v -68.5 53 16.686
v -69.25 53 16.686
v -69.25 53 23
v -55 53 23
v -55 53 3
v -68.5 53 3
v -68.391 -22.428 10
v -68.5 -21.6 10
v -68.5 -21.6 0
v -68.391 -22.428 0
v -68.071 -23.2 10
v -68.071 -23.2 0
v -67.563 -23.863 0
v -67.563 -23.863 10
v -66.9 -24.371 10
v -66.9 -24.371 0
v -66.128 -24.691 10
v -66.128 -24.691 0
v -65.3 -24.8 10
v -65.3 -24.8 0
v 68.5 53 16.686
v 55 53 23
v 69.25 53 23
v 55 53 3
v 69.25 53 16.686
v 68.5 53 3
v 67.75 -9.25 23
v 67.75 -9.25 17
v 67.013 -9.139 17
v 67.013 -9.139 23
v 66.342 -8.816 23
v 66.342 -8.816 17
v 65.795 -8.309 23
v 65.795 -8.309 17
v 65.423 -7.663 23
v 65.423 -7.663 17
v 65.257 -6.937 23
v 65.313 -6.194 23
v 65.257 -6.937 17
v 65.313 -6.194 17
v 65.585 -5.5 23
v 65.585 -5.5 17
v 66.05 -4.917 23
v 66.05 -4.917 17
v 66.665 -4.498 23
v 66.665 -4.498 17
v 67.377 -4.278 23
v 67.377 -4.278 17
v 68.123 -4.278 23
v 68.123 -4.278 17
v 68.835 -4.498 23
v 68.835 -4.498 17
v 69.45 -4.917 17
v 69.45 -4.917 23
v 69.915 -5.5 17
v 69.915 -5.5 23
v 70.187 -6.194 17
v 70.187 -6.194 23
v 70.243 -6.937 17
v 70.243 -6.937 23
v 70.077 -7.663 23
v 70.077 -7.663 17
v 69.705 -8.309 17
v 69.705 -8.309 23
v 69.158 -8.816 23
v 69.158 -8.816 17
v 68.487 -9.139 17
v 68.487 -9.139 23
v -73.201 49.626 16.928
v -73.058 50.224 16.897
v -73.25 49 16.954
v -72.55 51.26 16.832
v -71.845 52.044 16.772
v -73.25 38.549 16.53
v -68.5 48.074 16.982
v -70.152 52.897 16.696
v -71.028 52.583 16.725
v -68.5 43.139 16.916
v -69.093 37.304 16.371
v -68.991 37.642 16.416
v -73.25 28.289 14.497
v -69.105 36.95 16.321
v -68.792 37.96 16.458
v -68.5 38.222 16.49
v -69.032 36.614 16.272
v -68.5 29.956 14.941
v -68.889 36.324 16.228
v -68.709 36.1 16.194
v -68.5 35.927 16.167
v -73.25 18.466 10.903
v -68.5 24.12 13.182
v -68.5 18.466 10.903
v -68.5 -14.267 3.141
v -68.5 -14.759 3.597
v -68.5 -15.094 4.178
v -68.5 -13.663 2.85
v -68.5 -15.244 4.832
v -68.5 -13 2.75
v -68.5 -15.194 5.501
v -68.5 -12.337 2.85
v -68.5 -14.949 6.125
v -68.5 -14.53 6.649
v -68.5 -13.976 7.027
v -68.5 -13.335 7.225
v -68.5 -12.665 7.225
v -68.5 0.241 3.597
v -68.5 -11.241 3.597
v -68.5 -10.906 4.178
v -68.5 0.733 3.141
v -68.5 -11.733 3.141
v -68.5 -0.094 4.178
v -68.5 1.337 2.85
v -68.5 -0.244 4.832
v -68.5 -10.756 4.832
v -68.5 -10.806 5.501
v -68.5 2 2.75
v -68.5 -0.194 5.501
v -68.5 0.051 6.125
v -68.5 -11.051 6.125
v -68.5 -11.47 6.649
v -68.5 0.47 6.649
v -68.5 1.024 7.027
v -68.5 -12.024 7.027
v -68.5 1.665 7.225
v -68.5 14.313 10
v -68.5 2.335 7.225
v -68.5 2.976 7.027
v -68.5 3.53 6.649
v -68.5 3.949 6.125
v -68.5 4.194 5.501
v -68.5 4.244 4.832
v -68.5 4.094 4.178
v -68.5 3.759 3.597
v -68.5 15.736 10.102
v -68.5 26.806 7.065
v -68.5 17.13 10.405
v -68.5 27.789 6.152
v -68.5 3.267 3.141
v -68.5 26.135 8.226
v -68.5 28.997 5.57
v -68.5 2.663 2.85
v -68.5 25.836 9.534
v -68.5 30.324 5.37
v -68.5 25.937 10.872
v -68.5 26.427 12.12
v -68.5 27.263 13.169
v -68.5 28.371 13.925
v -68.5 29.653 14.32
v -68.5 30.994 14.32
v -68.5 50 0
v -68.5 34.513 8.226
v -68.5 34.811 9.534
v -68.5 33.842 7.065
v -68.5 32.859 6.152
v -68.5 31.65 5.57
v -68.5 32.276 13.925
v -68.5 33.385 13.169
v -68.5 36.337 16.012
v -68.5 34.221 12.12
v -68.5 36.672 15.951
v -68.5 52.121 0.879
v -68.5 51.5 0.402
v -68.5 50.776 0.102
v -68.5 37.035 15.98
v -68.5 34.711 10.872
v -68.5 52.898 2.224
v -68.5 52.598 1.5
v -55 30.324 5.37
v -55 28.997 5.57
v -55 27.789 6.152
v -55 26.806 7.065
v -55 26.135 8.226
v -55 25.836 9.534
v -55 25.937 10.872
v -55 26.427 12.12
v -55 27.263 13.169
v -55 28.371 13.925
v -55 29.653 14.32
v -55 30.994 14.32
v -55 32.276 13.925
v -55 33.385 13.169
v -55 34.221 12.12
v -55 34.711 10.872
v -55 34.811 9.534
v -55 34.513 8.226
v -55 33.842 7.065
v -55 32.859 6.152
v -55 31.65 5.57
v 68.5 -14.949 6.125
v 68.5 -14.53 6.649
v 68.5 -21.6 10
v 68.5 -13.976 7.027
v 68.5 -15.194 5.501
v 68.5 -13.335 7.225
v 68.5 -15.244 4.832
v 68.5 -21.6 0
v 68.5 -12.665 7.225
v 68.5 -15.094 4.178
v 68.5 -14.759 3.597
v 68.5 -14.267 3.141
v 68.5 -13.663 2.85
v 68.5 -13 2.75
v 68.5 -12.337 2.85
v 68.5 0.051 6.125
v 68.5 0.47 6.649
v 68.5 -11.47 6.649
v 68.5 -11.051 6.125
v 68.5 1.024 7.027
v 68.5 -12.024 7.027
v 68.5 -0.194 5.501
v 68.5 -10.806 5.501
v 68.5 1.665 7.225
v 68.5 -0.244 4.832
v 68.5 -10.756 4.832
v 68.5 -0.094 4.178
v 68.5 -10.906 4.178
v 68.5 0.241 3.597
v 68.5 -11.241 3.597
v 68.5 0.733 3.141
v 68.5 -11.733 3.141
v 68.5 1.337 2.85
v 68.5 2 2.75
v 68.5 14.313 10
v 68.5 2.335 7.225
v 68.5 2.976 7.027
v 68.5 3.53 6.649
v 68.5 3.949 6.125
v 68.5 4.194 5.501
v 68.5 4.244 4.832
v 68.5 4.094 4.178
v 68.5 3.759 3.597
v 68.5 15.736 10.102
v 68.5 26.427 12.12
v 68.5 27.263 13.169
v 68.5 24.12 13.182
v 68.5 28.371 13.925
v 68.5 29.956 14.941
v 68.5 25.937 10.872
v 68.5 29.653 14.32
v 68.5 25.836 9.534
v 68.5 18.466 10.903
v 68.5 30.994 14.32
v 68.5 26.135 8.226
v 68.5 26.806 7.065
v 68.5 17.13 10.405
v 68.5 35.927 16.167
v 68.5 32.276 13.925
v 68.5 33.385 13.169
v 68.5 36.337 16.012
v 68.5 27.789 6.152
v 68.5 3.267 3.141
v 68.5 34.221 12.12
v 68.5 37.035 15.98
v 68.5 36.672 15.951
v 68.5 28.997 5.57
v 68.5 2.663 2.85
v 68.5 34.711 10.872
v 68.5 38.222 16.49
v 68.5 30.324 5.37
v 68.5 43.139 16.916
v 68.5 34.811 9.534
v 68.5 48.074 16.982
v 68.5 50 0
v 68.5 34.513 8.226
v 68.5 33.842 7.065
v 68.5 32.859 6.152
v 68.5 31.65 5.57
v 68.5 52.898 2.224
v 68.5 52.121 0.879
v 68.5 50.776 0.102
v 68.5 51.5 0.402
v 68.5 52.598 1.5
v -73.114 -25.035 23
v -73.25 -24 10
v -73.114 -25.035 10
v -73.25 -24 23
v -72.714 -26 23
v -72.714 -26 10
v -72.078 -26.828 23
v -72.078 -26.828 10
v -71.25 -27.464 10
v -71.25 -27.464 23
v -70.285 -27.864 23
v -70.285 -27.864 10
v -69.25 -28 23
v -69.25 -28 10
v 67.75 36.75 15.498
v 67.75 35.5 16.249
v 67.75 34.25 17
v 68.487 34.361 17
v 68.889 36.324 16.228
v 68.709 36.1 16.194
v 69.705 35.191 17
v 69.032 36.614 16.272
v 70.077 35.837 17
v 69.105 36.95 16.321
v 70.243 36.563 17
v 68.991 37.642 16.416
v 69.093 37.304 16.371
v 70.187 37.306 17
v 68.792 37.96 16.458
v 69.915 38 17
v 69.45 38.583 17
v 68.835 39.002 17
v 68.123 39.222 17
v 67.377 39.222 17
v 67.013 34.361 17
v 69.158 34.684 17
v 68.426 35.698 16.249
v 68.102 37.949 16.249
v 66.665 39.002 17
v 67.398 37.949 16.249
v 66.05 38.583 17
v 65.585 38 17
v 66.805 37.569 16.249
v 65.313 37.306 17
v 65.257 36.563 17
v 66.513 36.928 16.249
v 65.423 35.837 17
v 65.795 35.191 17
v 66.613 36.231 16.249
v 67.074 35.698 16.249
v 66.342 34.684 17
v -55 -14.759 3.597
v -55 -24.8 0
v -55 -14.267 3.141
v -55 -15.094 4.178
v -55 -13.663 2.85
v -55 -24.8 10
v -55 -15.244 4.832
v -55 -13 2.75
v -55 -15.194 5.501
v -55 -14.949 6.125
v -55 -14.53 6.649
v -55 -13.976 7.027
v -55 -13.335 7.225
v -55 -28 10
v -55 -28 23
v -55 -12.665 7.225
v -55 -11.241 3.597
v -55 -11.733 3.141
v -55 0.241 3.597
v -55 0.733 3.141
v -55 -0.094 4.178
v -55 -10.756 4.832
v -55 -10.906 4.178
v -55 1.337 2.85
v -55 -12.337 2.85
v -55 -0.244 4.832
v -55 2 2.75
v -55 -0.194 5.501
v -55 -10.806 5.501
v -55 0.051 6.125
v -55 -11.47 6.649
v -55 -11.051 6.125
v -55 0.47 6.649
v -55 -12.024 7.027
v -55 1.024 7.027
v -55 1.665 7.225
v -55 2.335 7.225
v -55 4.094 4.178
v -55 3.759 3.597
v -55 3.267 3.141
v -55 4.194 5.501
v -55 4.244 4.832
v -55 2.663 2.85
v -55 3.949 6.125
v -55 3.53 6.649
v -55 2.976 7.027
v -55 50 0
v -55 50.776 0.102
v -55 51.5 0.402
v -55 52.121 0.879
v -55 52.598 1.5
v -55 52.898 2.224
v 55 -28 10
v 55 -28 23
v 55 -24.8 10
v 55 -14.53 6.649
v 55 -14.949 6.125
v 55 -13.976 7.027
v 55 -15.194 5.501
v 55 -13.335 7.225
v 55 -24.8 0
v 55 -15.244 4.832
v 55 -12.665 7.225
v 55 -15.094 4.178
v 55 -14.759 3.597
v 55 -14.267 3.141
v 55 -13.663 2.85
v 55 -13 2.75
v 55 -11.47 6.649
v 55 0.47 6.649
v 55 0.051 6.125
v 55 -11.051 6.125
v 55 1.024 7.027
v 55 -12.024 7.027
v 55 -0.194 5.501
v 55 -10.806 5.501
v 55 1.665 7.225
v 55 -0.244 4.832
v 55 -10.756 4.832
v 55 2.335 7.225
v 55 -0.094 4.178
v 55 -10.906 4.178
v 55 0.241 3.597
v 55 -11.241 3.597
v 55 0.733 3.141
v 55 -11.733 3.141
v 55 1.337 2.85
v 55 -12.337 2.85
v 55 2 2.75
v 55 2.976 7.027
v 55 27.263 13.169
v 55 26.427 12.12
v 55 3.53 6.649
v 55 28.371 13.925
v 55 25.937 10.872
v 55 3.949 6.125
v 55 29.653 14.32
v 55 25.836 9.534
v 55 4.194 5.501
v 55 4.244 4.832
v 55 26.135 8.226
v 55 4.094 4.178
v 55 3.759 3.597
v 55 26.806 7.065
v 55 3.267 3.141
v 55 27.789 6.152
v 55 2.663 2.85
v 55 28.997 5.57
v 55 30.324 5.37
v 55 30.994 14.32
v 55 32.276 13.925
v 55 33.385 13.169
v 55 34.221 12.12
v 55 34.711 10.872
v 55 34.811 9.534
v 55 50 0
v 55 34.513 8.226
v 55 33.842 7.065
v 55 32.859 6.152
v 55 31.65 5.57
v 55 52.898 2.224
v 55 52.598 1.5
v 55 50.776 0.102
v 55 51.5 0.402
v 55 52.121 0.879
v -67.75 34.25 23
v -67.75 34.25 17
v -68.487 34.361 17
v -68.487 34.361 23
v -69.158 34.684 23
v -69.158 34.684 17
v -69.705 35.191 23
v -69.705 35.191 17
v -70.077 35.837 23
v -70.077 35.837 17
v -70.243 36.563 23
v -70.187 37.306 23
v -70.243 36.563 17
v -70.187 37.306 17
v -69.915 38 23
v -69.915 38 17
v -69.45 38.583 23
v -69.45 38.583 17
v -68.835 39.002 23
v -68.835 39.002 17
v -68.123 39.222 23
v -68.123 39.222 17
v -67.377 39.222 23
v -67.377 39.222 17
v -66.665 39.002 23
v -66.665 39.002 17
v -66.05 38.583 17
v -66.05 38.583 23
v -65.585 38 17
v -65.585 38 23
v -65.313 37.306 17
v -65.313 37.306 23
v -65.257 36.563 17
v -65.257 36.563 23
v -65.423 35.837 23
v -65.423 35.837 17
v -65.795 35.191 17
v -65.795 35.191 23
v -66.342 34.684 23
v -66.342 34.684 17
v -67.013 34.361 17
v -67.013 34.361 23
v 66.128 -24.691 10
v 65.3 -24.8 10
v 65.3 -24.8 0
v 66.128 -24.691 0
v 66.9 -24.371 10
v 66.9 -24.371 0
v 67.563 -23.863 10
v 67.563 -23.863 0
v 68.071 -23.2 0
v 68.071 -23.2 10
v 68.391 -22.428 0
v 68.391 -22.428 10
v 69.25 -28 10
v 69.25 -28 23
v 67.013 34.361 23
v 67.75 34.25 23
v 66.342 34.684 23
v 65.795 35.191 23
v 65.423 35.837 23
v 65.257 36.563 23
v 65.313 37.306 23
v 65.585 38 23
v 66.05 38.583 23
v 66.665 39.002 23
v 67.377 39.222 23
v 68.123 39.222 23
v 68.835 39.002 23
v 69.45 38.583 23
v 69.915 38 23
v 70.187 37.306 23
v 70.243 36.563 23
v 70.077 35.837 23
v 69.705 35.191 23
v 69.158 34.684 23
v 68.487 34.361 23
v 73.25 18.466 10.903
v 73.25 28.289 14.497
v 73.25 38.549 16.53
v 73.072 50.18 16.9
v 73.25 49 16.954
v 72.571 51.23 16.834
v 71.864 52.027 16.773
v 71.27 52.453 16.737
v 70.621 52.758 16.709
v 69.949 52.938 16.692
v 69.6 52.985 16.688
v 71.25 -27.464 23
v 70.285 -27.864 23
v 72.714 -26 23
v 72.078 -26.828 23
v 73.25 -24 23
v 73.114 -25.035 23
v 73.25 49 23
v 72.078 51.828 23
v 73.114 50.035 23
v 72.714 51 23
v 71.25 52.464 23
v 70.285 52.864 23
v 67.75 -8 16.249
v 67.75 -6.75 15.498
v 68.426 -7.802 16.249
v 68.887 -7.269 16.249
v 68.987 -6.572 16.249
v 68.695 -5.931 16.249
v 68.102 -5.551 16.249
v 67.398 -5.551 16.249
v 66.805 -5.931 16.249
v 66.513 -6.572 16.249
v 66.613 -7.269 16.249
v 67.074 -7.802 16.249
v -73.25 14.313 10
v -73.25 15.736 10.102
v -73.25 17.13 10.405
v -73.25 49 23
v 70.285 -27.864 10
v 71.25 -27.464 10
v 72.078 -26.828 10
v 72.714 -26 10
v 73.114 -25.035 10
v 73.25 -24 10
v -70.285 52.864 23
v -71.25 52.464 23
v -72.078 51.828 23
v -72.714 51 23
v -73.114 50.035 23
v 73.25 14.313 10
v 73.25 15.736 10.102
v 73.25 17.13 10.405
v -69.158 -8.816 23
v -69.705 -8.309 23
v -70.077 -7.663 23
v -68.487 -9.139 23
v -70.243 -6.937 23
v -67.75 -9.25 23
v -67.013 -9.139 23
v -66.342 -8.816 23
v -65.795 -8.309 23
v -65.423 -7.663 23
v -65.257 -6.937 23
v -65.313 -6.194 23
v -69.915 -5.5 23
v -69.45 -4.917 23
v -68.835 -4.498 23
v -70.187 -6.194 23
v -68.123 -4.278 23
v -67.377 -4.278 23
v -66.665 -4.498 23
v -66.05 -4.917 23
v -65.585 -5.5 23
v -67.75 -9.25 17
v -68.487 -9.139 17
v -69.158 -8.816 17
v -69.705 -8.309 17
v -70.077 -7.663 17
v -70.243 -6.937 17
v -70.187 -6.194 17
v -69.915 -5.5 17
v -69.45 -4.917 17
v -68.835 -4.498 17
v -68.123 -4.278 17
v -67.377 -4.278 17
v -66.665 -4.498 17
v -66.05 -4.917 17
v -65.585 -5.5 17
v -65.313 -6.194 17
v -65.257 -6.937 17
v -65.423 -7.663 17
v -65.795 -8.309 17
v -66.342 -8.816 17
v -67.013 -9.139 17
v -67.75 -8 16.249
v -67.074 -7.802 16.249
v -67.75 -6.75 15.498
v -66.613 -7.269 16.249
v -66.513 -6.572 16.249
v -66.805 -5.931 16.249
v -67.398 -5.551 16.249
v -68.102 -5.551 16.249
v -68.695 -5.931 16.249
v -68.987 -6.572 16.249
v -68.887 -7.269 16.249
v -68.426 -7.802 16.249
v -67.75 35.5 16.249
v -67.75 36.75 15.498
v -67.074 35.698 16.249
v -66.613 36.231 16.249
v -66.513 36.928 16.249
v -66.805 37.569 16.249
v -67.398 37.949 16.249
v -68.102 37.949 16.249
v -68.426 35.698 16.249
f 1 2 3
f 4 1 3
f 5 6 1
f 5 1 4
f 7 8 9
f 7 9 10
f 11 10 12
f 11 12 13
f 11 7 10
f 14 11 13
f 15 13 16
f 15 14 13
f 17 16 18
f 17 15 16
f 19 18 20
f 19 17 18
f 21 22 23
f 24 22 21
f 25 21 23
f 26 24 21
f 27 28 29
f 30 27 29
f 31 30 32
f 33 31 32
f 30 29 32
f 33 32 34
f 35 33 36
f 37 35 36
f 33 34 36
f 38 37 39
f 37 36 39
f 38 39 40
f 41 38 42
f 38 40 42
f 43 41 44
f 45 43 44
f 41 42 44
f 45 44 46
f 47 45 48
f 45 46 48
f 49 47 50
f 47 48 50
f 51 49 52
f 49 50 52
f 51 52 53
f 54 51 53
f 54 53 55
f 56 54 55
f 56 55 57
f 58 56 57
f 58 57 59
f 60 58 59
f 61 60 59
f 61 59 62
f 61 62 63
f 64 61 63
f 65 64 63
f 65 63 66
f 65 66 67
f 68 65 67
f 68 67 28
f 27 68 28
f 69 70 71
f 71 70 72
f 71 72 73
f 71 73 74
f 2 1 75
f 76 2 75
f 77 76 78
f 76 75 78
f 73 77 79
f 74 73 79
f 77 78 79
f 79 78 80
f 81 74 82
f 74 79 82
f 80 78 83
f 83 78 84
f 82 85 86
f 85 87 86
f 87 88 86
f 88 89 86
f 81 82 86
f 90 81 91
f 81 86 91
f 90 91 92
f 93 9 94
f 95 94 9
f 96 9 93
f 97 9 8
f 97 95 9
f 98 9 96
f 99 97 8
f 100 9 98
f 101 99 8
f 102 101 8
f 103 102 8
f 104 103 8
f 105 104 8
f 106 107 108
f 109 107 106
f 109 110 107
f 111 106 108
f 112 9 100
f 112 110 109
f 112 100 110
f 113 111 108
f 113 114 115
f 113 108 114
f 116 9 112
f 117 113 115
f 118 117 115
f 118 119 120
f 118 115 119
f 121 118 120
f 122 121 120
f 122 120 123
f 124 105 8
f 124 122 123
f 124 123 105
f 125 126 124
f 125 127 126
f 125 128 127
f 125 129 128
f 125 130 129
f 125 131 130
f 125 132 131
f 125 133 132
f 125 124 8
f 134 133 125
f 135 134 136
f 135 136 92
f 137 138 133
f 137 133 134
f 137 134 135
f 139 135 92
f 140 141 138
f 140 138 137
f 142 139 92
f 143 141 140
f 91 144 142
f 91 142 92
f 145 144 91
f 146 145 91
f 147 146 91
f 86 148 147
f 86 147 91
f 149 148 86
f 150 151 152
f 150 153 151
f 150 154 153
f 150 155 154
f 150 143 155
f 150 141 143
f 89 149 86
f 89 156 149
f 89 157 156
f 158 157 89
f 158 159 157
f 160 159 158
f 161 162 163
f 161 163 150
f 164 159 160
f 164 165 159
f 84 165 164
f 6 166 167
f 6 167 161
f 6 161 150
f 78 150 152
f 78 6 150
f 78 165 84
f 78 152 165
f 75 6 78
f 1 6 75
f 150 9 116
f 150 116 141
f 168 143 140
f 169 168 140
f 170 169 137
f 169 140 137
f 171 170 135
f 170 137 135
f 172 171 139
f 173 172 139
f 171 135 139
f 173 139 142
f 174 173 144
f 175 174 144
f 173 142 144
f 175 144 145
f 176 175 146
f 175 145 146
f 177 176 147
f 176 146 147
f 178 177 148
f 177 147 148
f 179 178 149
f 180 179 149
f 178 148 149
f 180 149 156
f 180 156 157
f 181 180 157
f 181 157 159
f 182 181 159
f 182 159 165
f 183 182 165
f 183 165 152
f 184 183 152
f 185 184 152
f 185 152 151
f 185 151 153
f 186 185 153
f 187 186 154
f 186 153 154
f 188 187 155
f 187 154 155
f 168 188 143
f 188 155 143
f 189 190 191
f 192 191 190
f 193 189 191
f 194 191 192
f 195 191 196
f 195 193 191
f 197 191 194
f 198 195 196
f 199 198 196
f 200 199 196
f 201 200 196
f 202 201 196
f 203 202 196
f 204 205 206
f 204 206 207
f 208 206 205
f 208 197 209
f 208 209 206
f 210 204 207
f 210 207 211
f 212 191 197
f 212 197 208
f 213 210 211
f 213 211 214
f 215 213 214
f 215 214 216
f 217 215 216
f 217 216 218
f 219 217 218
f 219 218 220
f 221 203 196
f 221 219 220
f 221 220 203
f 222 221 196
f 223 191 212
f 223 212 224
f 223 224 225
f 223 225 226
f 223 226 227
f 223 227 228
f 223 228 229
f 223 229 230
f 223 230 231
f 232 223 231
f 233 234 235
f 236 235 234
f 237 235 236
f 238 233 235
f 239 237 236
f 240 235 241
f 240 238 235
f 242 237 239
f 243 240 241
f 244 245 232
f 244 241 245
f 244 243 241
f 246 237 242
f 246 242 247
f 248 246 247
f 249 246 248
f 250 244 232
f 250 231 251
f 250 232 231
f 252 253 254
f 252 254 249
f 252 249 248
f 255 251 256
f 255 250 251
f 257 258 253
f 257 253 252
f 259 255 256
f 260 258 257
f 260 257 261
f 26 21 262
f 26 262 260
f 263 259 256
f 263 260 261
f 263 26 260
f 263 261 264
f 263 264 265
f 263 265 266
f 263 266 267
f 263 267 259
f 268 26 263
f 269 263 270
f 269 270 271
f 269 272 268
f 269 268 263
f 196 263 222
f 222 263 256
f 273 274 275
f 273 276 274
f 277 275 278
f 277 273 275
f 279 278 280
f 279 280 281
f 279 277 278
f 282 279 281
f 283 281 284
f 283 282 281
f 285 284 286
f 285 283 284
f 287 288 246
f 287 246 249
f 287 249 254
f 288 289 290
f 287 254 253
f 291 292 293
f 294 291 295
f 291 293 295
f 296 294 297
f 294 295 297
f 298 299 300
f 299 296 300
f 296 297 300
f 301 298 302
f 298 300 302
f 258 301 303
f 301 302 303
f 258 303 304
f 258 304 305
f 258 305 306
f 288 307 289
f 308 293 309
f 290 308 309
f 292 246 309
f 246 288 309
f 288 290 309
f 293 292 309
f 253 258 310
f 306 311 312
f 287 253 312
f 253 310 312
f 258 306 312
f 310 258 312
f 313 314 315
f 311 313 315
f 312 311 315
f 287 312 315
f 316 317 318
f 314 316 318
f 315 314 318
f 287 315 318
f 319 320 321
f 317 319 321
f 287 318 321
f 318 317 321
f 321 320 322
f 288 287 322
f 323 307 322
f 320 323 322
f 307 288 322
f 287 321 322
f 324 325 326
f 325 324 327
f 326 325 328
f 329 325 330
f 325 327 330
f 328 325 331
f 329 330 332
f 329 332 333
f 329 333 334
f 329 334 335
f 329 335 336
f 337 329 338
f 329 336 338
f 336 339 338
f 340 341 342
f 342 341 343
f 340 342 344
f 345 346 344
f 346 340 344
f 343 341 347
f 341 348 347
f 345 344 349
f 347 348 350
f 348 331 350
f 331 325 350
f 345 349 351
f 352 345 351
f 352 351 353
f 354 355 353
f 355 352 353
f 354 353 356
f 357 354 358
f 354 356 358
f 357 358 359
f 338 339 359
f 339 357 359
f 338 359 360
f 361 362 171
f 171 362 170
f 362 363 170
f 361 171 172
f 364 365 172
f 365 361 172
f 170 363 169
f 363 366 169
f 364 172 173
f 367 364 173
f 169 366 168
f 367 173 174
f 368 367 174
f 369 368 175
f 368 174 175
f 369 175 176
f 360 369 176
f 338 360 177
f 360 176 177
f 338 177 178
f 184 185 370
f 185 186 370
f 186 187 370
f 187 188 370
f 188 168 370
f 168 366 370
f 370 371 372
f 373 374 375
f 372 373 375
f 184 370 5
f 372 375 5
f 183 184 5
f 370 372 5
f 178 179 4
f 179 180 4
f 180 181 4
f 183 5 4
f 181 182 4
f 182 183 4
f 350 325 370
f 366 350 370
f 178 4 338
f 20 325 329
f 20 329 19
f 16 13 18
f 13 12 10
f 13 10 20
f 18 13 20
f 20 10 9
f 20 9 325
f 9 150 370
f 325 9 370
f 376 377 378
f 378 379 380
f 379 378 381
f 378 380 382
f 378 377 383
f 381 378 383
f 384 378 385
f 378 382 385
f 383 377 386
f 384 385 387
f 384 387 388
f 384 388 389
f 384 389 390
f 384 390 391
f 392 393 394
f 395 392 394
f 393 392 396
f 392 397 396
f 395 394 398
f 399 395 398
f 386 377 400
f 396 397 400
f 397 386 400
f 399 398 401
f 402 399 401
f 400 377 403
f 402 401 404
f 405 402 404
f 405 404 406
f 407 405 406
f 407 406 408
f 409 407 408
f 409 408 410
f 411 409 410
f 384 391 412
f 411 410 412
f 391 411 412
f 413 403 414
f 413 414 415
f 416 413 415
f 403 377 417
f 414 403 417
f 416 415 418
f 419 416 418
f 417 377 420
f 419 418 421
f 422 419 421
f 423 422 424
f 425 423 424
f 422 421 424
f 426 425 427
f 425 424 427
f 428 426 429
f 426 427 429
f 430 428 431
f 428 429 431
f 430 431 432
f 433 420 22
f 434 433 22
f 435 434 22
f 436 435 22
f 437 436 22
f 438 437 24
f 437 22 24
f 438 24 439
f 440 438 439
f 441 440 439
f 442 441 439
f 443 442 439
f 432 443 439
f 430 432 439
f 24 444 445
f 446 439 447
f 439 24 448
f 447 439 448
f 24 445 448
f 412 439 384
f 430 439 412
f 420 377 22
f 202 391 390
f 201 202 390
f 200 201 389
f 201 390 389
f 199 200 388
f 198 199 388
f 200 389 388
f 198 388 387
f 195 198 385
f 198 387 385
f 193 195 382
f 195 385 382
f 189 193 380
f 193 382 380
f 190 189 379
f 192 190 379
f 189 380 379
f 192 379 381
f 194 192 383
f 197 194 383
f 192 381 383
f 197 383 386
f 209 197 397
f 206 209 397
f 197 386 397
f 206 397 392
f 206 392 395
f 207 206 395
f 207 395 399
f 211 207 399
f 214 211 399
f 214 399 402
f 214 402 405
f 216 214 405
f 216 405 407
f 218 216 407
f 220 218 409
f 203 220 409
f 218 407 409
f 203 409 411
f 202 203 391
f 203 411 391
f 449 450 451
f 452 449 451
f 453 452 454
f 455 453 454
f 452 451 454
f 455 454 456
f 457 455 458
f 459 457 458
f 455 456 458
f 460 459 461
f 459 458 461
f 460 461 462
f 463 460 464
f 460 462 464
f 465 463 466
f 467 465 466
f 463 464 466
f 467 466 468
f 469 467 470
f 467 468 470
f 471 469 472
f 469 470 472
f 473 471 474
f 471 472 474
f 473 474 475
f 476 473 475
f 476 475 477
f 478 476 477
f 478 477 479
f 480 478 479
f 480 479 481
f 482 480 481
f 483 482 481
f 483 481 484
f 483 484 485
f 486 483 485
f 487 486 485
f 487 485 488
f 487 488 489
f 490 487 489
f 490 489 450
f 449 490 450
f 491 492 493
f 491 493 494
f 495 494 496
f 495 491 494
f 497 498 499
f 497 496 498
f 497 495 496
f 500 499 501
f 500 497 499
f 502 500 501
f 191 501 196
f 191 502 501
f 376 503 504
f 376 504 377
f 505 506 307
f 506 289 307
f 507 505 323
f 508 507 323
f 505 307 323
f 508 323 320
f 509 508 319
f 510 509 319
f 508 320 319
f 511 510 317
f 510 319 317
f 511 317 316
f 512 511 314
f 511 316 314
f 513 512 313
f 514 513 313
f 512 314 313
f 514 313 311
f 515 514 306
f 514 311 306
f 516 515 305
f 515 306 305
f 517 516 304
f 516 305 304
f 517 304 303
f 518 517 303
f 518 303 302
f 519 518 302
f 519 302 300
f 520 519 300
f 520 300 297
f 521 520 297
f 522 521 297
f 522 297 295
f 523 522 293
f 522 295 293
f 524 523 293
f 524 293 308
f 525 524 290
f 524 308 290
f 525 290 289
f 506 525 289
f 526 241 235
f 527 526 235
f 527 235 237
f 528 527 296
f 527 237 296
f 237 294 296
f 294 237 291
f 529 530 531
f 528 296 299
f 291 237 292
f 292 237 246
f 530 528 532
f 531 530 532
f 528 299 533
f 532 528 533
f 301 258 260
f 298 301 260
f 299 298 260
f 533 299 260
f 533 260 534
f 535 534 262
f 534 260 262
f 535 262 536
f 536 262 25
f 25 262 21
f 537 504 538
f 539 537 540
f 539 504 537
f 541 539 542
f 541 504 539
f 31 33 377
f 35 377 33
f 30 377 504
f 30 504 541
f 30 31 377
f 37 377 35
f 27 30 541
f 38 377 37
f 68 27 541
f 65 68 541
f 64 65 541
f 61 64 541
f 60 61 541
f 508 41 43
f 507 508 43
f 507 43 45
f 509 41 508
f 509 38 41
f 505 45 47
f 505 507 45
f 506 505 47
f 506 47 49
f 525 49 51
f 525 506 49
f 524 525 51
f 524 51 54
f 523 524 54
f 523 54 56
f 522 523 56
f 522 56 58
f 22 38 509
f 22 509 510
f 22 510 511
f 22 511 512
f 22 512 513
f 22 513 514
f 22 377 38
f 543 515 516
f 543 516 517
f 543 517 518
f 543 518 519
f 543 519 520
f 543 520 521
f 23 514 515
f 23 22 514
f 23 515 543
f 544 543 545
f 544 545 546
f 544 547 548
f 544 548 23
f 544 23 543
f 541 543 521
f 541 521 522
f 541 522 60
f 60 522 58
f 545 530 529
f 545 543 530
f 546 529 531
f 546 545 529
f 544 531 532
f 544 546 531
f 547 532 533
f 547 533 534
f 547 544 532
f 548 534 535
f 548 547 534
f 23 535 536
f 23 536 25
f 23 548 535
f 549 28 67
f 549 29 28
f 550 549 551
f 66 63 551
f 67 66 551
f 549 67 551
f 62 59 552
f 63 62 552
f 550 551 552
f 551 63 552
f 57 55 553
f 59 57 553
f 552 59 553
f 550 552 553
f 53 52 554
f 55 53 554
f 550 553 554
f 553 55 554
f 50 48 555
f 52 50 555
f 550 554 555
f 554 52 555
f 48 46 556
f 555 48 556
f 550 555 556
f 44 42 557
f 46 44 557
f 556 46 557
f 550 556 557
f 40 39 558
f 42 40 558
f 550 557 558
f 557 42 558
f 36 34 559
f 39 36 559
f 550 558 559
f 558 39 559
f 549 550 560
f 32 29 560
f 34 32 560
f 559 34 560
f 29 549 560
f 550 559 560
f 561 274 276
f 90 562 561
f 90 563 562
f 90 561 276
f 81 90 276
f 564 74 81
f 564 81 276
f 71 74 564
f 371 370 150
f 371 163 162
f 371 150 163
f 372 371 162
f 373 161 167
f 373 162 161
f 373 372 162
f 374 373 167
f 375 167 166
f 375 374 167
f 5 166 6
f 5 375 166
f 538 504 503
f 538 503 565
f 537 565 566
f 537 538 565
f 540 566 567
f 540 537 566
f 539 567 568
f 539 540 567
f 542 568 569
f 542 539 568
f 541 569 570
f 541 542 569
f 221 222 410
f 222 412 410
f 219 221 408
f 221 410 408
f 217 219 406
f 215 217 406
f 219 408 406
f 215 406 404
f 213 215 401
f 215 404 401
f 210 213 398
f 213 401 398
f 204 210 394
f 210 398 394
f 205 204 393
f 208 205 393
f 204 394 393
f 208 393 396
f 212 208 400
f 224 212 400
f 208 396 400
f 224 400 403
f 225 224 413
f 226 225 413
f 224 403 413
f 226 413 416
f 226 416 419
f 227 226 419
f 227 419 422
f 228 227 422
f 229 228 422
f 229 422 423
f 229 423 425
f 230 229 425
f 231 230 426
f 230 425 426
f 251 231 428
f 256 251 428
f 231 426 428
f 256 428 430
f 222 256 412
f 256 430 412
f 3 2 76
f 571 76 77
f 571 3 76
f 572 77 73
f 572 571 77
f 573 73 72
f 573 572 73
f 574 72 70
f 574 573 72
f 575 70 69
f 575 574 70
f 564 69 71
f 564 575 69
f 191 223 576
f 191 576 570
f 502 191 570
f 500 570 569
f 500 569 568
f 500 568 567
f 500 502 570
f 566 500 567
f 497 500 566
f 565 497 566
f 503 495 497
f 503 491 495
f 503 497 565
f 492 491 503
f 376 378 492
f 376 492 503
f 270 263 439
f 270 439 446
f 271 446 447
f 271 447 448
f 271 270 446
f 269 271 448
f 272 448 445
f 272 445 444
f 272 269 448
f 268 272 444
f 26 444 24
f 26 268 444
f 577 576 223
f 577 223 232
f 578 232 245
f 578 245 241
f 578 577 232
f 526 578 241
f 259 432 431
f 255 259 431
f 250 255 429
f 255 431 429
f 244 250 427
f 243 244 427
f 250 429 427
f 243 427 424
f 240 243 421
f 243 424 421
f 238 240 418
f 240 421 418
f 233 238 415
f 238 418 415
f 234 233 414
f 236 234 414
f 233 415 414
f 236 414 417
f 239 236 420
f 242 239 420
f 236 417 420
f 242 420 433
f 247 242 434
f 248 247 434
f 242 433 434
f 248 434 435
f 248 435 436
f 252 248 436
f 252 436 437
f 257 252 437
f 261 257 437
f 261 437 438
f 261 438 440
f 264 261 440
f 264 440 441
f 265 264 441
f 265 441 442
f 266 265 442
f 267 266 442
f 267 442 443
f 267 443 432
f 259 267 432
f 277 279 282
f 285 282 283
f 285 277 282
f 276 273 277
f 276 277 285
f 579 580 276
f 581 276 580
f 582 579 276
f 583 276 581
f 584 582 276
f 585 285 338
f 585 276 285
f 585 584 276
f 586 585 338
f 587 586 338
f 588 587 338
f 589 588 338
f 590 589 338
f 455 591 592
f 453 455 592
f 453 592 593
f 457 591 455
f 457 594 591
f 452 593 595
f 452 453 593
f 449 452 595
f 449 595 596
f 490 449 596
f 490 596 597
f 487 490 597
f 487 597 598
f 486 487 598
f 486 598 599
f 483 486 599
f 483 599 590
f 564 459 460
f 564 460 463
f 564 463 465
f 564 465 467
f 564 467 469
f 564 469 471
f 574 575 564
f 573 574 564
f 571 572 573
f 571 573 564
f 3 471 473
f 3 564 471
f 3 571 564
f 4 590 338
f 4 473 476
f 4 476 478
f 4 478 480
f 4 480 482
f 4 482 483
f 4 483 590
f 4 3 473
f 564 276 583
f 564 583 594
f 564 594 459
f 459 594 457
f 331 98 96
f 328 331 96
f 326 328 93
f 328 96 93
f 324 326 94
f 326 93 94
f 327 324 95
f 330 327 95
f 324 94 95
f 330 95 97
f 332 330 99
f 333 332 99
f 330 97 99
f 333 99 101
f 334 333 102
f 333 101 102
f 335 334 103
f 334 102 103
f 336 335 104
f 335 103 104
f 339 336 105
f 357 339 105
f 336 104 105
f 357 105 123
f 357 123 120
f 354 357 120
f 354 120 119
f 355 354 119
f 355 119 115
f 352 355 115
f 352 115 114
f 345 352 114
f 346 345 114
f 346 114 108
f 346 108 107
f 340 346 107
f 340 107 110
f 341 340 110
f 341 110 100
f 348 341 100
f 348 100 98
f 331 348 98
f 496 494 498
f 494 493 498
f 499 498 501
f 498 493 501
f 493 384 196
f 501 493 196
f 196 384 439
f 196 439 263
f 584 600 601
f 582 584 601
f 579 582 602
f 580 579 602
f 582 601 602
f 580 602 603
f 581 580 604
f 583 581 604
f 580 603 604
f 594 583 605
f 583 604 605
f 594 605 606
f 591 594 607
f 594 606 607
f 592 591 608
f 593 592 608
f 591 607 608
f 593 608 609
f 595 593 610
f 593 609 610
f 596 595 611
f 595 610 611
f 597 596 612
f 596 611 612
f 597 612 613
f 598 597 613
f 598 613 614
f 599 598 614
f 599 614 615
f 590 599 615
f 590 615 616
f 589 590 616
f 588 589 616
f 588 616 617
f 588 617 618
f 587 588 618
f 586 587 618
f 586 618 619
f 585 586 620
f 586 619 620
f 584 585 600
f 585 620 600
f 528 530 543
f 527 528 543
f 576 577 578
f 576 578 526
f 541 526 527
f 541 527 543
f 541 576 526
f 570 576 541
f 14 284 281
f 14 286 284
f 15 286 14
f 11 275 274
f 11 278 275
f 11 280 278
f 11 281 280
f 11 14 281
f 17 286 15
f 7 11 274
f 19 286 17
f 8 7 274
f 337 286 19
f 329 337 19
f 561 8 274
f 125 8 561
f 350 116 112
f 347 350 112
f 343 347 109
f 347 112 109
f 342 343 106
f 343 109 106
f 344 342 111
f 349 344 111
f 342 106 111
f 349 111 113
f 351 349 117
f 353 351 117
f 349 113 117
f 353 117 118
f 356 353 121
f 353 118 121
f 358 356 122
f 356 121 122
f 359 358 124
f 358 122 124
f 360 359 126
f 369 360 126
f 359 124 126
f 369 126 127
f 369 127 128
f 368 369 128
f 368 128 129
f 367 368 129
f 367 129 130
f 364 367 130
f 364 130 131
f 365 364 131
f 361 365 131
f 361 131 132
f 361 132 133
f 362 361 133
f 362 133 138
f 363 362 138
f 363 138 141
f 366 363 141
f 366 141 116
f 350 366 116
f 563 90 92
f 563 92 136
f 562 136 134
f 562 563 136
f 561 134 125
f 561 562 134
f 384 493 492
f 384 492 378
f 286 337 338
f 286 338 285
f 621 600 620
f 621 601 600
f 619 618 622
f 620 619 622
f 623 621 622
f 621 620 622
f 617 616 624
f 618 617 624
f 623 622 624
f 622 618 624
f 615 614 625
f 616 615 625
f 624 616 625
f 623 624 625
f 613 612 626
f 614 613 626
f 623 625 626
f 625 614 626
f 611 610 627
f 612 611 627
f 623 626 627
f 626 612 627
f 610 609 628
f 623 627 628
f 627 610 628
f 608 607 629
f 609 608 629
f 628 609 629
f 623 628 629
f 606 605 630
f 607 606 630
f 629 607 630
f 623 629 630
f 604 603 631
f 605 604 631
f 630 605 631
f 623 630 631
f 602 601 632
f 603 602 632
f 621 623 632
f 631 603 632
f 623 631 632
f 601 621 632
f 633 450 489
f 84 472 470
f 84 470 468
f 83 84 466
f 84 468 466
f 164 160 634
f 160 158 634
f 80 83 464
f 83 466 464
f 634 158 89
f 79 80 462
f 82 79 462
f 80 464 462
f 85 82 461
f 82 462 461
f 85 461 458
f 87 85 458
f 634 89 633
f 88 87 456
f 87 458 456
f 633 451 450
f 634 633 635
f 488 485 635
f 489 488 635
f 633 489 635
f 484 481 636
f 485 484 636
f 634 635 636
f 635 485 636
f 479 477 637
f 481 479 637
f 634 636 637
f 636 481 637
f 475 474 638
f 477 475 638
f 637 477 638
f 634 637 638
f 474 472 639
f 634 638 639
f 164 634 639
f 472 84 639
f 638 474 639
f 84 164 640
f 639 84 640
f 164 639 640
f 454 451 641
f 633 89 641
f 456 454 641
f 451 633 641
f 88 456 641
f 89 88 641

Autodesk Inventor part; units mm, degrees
ref_plane "XZ Plane" through (0, 0, 0) normal (0, 1, 0) x (-1, 0, 0)
ref_plane "XY Plane" through (0, 0, 0) normal (0, 0, 1) x (1, 0, 0)
sketch "スケッチ2" plane through (0, 0, 0) normal (0, 0, 1) x (1, 0, 0)
  line L0 (-70.25, -25) -> (70.25, -25) construction
  line L1 (70.25, -25) -> (70.25, 50) construction
  line L2 (70.25, 50) -> (-70.25, 50) construction
  line L3 (-70.25, 50) -> (-70.25, -25) construction
  line L4 (73.25, -28) -> (-73.25, -28)
  line L5 (-73.25, -28) -> (-73.25, 53)
  line L6 (-73.25, 53) -> (73.25, 53)
  line L7 (73.25, 53) -> (73.25, -28)
  point P0 (0, 0)
  dimension "d0" = 140.5
  dimension "d2" = 3
  dimension "d3" = 3
  dimension "d58" = 50
  dimension "d59" = 3
  dimension "d60" = 25
  dimension "d72" = 3
  dimension "d73" = 70.25
extrude "押し出し1" add sketch "スケッチ2" along normal blind 23
ref_plane "作業平面1" through (68.5, 0, 0) normal (1, 0, 0) x (0, 1, 0)
sketch "スケッチ3" plane through (68.5, -28, 0) normal (1, 0, 0) x (0, 0, -1)
  circle A0 centre (50.5, 74.5) radius 67.5
  line L0 (0, 0) -> (-23, 0) projected
  line L1 (0, 0) -> (0, 81) projected
  line L2 (-10, 44.5667) -> (-10, 0)
  line L3 (0, 0) -> (-23, 0) projected
  point P0 (0, 28)
  point P1 (0, 29.7116)
  dimension "d6" = 135
  dimension "d7" = 74.5
  dimension "d9" = 60.5
  dimension "d23" = 10
extrude "押し出し2" cut sketch "スケッチ3" along normal through all
sketch "スケッチ4" plane through (0, 0, 23) normal (0, 0, 1) x (1, 0, 0)
  line L0 (-67.75, -6.75) -> (67.75, -6.75)
  line L1 (67.75, -6.75) -> (67.75, 36.75)
  line L2 (67.75, 36.75) -> (-67.75, 36.75)
  line L3 (-67.75, 36.75) -> (-67.75, -6.75)
  line L4 (-67.75, -6.75) -> (67.75, 36.75) construction
  line L5 (67.75, -6.75) -> (-67.75, 36.75) construction
  line L6 (73.25, 53) -> (-73.25, 53) projected
  point P0 (0, 0)
  point P1 (0, 15)
  dimension "d13" = 135.5
  dimension "d14" = 43.5
  dimension "d86" = 15
hole "穴1" at (67.75, -6.75, 23) at (67.75, 36.75, 23) at (-67.75, 36.75, 23) at (-67.75, -6.75, 23) direction (0, 0, -1) diameter 5 depth 6 tip angle 118
sketch "スケッチ5" plane through (68.5, -28, 0) normal (1, 0, 0) x (0, 0, -1)
  line L0 (0, 0) -> (-10, 0) projected
  line L1 (-10, 0) -> (-10, 44.5667) projected
  point P0 (0, 28)
  point P1 (-5, 15)
  point P2 (-5, 30)
  point P3 (-10, 35.913)
  dimension "d24" = 15
  dimension "d25" = 15
  dimension "d26" = 5
hole "穴2" at (68.5, -13, 5) at (68.5, 2, 5) direction (-1, 0, 0) diameter 4.5 end through all clearance for "Flat Head Machine Screw" size "M4" standard "Ansi Metric M Profile"
fillet "フィレット2" radius 10 1 edges at (70.875, 16.5667, 10)
sketch "スケッチ11" plane through (-73.25, 53, 23) normal (0, 1, 0) x (1, 0, 0)
  line L0 (0, 23) -> (141.75, 23) projected
  line L1 (0, 0) -> (146.5, 0) projected
  line L2 (18.25, 0) -> (128.25, 0)
  line L3 (128.25, 0) -> (128.25, 23)
  line L4 (128.25, 23) -> (18.25, 23)
  line L5 (18.25, 23) -> (18.25, 0)
  line L6 (141.75, 6.3137) -> (141.75, 23) projected
  line L7 (146.5, 6.3137) -> (146.5, 0) projected
  line L8 (0, 23) -> (0, 0) projected
  dimension "d68" = 18.25
  dimension "d69" = 18.25
  dimension "d70" = 0
extrude "押し出し8" cut sketch "スケッチ11" against normal through all contours L0 L3 L1 L5
mirror "ミラー1" about plane through (0, 0, 0) normal (1, 0, 0) of "押し出し2", "穴2", "フィレット2"
sketch "スケッチ7" plane through (0, 0, 0) normal (0, 0, -1) x (-1, 0, 0)
  line L0 (68.5, -28) -> (68.5, 53) projected
  line L1 (-68.5, -24.8) -> (68.5, -24.8)
  line L2 (68.5, -24.8) -> (68.5, -28)
  line L3 (68.5, -28) -> (-68.5, -28)
  line L4 (-68.5, -28) -> (-68.5, -24.8)
  line L5 (-68.5, -24.8) -> (68.5, -28) construction
  line L6 (68.5, -24.8) -> (-68.5, -28) construction
  point P0 (0, 0)
  point P1 (0, -26.4)
  point P2 (-68.5, -28)
  point P3 (68.5, -24.8)
  dimension "d38" = 3.2
extrude "押し出し4" cut sketch "スケッチ7" against normal up to surface (10 mm away)
fillet "フィレット3" radius 3.2 2 edges at (68.5, -24.8, 5) (-68.5, -24.8, 5)
fillet "フィレット6" radius 4 4 edges at (73.25, -28, 16.5) (-73.25, -28, 16.5) (73.25, 53, 19.8432) (-73.25, 53, 19.8432)
fillet "フィレット8" radius 3 2 edges at (-61.75, 53, 0) (61.75, 53, 0)
sketch "スケッチ12" plane through (68.5, -28, 0) normal (1, 0, 0) x (0, 0, -1)
  circle A0 centre (50.5, 74.5) radius 67.5 projected
  circle A1 centre (50.5, 74.5) radius 62.5
  line L0 (-9.8704, 58.3238) -> (50.5, 74.5)
  line L1 (-16.6863, 81) -> (-3, 81) projected
  point P0 (0, 28)
  dimension "d75" = 125
  dimension "d76" = 15
hole "穴3" at (68.5, 30.3238, 9.8704) direction (-1, 0, 0) diameter 9 end through all
equation "\"d2\" = d3"
equation "\"d69\" = d68"
properties part number "base44" material "ABS プラスチック"
